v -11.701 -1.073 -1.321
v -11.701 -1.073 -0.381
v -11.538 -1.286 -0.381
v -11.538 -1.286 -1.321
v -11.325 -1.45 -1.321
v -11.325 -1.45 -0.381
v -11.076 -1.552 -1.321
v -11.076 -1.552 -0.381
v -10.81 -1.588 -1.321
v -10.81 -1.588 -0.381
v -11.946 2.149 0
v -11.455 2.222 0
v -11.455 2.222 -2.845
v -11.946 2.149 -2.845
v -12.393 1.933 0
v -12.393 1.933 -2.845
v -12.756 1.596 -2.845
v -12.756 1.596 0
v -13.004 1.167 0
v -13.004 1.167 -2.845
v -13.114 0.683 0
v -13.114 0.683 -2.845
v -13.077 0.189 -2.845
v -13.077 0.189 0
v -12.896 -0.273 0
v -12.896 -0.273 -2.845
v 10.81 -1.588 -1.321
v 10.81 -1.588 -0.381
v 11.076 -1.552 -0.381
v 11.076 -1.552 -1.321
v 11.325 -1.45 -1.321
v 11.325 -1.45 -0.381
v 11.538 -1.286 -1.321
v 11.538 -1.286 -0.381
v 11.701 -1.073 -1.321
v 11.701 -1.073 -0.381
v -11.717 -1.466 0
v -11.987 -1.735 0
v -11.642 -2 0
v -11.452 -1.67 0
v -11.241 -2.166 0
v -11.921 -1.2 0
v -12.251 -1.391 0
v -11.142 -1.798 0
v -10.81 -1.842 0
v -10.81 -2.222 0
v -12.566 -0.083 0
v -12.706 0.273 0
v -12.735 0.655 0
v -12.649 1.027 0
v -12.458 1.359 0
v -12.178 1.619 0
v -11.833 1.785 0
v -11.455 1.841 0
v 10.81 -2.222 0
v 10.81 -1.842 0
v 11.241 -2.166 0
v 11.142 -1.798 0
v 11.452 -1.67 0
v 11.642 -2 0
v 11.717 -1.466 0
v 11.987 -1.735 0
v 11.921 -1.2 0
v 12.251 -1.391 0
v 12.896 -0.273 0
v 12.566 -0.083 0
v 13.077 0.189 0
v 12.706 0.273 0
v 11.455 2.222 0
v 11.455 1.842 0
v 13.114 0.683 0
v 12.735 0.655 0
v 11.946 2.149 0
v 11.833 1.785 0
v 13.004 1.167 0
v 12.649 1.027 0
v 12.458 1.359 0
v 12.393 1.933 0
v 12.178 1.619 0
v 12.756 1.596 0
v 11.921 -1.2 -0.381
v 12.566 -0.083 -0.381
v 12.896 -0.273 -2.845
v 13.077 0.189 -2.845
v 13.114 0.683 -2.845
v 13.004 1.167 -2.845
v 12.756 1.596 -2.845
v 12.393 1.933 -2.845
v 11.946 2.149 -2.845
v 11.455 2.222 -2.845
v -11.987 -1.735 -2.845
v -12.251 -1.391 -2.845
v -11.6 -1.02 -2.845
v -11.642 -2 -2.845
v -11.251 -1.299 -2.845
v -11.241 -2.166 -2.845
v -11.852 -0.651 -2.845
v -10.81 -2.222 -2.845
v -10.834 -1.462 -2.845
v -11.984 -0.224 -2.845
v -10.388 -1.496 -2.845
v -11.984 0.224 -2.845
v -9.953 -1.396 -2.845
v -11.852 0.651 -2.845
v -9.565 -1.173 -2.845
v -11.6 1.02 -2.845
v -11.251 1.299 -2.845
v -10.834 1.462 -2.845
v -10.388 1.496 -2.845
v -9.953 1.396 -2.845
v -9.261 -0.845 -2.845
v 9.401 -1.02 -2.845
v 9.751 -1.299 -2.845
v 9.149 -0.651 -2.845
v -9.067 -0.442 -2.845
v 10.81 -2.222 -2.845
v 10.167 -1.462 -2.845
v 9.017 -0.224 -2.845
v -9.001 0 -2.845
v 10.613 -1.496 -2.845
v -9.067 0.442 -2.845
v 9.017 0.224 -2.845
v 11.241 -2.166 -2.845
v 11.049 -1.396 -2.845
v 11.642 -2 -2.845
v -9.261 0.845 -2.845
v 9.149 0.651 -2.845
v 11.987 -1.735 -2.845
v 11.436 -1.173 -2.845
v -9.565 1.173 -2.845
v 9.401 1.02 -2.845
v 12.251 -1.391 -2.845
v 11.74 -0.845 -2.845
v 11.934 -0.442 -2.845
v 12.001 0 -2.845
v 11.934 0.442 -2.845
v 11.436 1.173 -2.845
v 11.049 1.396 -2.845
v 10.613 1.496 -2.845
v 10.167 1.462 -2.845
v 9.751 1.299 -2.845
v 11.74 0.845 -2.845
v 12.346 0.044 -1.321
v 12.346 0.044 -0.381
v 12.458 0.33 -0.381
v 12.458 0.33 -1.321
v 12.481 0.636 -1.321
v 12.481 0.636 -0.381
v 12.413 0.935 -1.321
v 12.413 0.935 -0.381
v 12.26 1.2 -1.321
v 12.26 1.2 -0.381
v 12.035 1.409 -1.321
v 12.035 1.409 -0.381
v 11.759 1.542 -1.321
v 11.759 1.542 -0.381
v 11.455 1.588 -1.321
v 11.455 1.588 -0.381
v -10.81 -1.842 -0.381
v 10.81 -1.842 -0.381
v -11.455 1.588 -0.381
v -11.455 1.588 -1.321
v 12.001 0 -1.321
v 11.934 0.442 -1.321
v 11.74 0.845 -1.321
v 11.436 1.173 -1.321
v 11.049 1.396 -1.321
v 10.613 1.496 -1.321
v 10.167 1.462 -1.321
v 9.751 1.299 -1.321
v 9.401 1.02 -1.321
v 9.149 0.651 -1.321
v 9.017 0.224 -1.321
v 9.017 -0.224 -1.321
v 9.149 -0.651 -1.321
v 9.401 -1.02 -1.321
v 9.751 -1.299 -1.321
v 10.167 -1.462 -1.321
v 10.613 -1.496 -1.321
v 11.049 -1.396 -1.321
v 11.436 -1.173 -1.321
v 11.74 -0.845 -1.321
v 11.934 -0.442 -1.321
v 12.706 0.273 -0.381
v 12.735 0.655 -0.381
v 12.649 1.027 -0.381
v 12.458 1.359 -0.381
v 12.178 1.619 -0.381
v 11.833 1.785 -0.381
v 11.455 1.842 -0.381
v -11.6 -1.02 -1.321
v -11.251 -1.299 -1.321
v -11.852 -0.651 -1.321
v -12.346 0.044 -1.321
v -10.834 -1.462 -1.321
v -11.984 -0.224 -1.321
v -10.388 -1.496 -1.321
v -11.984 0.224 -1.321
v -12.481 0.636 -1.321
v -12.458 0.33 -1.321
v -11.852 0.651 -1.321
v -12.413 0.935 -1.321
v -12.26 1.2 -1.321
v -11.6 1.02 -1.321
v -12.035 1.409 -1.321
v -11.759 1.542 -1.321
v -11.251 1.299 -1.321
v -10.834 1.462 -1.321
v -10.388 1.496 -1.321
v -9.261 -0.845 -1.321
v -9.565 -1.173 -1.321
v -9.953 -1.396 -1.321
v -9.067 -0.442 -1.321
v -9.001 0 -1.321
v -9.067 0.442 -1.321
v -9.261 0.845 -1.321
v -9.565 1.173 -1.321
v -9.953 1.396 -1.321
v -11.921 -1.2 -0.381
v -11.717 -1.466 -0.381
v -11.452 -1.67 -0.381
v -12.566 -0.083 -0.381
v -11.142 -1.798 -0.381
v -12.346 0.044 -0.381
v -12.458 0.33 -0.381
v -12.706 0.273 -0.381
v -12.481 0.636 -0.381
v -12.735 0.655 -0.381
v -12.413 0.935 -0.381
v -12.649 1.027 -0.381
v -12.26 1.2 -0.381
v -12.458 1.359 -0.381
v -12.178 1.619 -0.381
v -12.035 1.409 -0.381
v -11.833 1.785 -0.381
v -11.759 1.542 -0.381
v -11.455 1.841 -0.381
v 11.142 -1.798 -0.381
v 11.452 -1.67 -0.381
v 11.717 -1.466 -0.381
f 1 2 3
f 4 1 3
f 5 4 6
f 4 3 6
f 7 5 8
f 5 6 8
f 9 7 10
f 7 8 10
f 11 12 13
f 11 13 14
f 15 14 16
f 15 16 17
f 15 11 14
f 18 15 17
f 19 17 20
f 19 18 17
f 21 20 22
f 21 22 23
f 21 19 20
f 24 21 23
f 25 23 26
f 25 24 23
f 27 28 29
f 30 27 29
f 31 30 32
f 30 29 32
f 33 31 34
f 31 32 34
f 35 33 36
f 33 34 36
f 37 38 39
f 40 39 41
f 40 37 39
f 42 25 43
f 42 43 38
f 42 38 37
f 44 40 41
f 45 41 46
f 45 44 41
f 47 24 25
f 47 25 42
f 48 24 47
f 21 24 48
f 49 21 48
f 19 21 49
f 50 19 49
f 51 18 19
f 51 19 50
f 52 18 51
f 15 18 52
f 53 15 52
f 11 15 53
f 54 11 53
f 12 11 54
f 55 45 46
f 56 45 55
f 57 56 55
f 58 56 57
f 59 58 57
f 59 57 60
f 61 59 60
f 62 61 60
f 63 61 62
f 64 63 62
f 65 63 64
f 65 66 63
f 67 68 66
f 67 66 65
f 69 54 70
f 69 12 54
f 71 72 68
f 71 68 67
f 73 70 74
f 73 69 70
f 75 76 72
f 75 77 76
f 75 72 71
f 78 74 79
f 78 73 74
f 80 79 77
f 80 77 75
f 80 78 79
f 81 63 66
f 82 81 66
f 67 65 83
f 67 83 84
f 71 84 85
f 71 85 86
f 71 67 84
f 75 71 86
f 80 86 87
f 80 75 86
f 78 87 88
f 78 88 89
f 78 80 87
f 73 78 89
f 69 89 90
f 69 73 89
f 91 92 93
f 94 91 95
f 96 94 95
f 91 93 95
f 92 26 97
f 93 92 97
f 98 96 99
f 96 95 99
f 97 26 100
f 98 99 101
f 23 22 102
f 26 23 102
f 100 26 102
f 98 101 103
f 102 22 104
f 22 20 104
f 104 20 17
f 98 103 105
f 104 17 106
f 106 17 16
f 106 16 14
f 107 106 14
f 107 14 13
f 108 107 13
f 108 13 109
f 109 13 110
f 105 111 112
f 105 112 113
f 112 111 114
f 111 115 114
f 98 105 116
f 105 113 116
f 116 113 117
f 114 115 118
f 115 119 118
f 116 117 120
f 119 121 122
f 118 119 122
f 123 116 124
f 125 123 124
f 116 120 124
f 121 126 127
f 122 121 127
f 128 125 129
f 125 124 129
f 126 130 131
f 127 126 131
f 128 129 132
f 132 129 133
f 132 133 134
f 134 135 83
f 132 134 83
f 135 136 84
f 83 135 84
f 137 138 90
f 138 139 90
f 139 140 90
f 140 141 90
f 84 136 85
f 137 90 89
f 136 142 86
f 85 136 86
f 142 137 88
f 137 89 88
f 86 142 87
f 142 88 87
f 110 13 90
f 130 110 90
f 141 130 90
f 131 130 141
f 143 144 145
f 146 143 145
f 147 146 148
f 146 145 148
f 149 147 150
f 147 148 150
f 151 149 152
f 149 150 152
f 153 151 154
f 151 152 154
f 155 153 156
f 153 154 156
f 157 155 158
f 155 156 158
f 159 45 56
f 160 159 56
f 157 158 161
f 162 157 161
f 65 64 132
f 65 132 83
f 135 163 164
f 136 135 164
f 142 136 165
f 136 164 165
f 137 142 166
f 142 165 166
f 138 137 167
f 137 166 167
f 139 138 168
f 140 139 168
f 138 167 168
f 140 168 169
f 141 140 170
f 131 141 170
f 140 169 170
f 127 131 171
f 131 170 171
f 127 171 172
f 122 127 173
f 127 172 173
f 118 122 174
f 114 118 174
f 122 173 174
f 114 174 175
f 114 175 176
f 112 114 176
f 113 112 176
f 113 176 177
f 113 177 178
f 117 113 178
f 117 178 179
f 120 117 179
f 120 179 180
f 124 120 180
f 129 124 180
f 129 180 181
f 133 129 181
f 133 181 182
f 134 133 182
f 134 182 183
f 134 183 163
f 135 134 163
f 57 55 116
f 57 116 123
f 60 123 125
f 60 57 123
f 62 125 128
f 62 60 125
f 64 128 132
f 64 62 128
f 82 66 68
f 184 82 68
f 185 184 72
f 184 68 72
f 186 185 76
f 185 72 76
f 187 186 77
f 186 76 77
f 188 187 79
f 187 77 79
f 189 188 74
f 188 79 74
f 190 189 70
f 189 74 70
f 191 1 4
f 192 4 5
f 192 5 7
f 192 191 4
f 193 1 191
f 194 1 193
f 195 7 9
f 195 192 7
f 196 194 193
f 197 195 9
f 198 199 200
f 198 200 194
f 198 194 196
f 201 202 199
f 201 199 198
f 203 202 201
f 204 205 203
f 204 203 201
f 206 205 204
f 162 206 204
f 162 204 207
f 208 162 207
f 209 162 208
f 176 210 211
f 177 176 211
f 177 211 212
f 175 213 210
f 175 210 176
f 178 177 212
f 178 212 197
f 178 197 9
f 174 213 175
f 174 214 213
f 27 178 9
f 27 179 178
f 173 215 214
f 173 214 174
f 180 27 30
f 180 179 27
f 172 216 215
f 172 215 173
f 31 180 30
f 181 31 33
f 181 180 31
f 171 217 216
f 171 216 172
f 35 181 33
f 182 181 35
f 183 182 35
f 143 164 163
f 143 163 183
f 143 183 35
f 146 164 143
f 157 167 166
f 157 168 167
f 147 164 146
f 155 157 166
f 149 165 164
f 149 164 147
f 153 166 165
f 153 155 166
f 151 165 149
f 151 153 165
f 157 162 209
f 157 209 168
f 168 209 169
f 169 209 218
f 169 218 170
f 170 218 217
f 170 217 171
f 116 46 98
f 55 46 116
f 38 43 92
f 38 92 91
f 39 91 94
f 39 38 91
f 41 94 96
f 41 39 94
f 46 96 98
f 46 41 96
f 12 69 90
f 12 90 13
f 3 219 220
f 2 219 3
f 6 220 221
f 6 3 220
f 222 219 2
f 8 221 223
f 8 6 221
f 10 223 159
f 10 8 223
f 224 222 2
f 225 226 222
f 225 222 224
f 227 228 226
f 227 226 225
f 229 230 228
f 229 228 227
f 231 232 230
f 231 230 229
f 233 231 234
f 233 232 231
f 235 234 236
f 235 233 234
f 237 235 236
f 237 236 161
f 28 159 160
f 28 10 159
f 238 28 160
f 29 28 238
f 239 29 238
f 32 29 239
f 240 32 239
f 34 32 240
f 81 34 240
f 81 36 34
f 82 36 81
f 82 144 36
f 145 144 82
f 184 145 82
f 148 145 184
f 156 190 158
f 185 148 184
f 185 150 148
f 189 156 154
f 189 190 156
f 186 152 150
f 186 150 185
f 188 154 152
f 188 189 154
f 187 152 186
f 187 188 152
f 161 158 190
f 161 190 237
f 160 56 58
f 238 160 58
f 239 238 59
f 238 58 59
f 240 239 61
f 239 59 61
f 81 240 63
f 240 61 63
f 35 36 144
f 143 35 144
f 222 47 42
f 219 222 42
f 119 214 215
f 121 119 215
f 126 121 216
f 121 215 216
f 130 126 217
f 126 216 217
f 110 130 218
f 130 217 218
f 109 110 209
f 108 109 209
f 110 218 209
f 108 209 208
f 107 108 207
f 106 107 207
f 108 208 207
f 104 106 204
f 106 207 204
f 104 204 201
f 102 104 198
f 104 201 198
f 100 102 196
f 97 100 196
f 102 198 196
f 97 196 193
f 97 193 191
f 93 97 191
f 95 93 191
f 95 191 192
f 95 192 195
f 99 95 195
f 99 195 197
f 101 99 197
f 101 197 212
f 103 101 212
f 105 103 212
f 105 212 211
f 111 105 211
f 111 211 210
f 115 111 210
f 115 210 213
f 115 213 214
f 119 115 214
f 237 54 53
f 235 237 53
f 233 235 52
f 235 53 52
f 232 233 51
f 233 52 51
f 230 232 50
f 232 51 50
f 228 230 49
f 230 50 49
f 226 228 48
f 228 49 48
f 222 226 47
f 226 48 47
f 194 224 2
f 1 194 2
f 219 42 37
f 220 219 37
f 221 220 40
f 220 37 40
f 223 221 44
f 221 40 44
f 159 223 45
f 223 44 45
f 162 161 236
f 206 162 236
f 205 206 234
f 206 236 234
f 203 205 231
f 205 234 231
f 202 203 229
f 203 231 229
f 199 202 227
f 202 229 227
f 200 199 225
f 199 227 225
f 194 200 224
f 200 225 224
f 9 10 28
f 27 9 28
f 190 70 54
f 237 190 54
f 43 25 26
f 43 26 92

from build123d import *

# Parameters (mm, degrees)
F0_R     = 1.5
F1_DEPTH = 2.8448
F2_DEPTH = 1.3208
F3_DEPTH = 0.381
F4_DEPTH = 2.8458


with BuildPart() as f1:
    # F0 (on Top) → F1 (new body)
    with BuildSketch(Plane.XY):
        with BuildLine():
            Line((11.4554, 2.2225), (-11.4554, 2.2225))
            ThreePointArc((-11.4554, 2.2225), (-12.896206, 1.39065), (-12.896206, -0.27305))
            Line((-12.896206, -0.27305), (-12.25096, -1.39065))
            ThreePointArc((-12.25096, -1.39065), (-11.642003, -1.999606), (-10.810153, -2.2225))
            Line((-10.810153, -2.2225), (10.810153, -2.2225))
            ThreePointArc((10.810153, -2.2225), (11.642003, -1.999606), (12.25096, -1.39065))
            Line((12.25096, -1.39065), (12.896206, -0.27305))
            ThreePointArc((12.896206, -0.27305), (12.896206, 1.39065), (11.4554, 2.2225))
        make_face()
        with BuildLine():
            ThreePointArc((-12.566251, -0.08255), (-12.566251, 1.20015), (-11.4554, 1.8415))
            Line((-11.4554, 1.8415), (11.4554, 1.8415))
            ThreePointArc((11.4554, 1.8415), (12.566251, 1.20015), (12.566251, -0.08255))
            Line((12.566251, -0.08255), (11.921004, -1.20015))
            ThreePointArc((11.921004, -1.20015), (11.451503, -1.669651), (10.810153, -1.8415))
            Line((10.810153, -1.8415), (-10.810153, -1.8415))
            ThreePointArc((-10.810153, -1.8415), (-11.451503, -1.669651), (-11.921004, -1.20015))
            Line((-11.921004, -1.20015), (-12.566251, -0.08255))
        make_face(mode=Mode.SUBTRACT)
        with BuildLine():
            Line((11.4554, 1.8415), (-11.4554, 1.8415))
            ThreePointArc((-11.4554, 1.8415), (-12.566251, 1.20015), (-12.566251, -0.08255))
            Line((-12.566251, -0.08255), (-11.921004, -1.20015))
            ThreePointArc((-11.921004, -1.20015), (-11.451503, -1.669651), (-10.810153, -1.8415))
            Line((-10.810153, -1.8415), (10.810153, -1.8415))
            ThreePointArc((10.810153, -1.8415), (11.451503, -1.669651), (11.921004, -1.20015))
            Line((11.921004, -1.20015), (12.566251, -0.08255))
            ThreePointArc((12.566251, -0.08255), (12.566251, 1.20015), (11.4554, 1.8415))
        make_face()
        with BuildLine():
            ThreePointArc((-12.34628, 0.04445), (-12.34628, 1.07315), (-11.4554, 1.5875))
            Line((-11.4554, 1.5875), (11.4554, 1.5875))
            ThreePointArc((11.4554, 1.5875), (12.34628, 1.07315), (12.34628, 0.04445))
            Line((12.34628, 0.04445), (11.701034, -1.07315))
            ThreePointArc((11.701034, -1.07315), (11.324503, -1.44968), (10.810153, -1.5875))
            Line((10.810153, -1.5875), (-10.810153, -1.5875))
            ThreePointArc((-10.810153, -1.5875), (-11.324503, -1.44968), (-11.701034, -1.07315))
            Line((-11.701034, -1.07315), (-12.34628, 0.04445))
        make_face(mode=Mode.SUBTRACT)
        with BuildLine():
            Line((11.4554, 1.5875), (-11.4554, 1.5875))
            ThreePointArc((-11.4554, 1.5875), (-12.34628, 1.07315), (-12.34628, 0.04445))
            Line((-12.34628, 0.04445), (-11.701034, -1.07315))
            ThreePointArc((-11.701034, -1.07315), (-11.324503, -1.44968), (-10.810153, -1.5875))
            Line((-10.810153, -1.5875), (10.810153, -1.5875))
            ThreePointArc((10.810153, -1.5875), (11.324503, -1.44968), (11.701034, -1.07315))
            Line((11.701034, -1.07315), (12.34628, 0.04445))
            ThreePointArc((12.34628, 0.04445), (12.34628, 1.07315), (11.4554, 1.5875))
        make_face()
        with Locations((-10.500578, 0)):
            Circle(F0_R, mode=Mode.SUBTRACT)
        with Locations((10.500578, 0)):
            Circle(F0_R, mode=Mode.SUBTRACT)
        with Locations((-10.500578, 0)):
            Circle(F0_R)
        with Locations((10.500578, 0)):
            Circle(F0_R)
    extrude(amount=-F1_DEPTH)

    # F0 (on Top) → F2 (cut)
    with BuildSketch(Plane.XY):
        with BuildLine():
            Line((11.4554, 1.5875), (-11.4554, 1.5875))
            ThreePointArc((-11.4554, 1.5875), (-12.34628, 1.07315), (-12.34628, 0.04445))
            Line((-12.34628, 0.04445), (-11.701034, -1.07315))
            ThreePointArc((-11.701034, -1.07315), (-11.324503, -1.44968), (-10.810153, -1.5875))
            Line((-10.810153, -1.5875), (10.810153, -1.5875))
            ThreePointArc((10.810153, -1.5875), (11.324503, -1.44968), (11.701034, -1.07315))
            Line((11.701034, -1.07315), (12.34628, 0.04445))
            ThreePointArc((12.34628, 0.04445), (12.34628, 1.07315), (11.4554, 1.5875))
        make_face()
        with Locations((-10.500578, 0)):
            Circle(F0_R, mode=Mode.SUBTRACT)
        with Locations((10.500578, 0)):
            Circle(F0_R, mode=Mode.SUBTRACT)
        with Locations((-10.500578, 0)):
            Circle(F0_R)
        with Locations((10.500578, 0)):
            Circle(F0_R)
    extrude(amount=-F2_DEPTH, mode=Mode.SUBTRACT)

    # F0 (on Top) → F3 (cut)
    with BuildSketch(Plane.XY):
        with BuildLine():
            Line((11.4554, 1.8415), (-11.4554, 1.8415))
            ThreePointArc((-11.4554, 1.8415), (-12.566251, 1.20015), (-12.566251, -0.08255))
            Line((-12.566251, -0.08255), (-11.921004, -1.20015))
            ThreePointArc((-11.921004, -1.20015), (-11.451503, -1.669651), (-10.810153, -1.8415))
            Line((-10.810153, -1.8415), (10.810153, -1.8415))
            ThreePointArc((10.810153, -1.8415), (11.451503, -1.669651), (11.921004, -1.20015))
            Line((11.921004, -1.20015), (12.566251, -0.08255))
            ThreePointArc((12.566251, -0.08255), (12.566251, 1.20015), (11.4554, 1.8415))
        make_face()
        with BuildLine():
            ThreePointArc((-12.34628, 0.04445), (-12.34628, 1.07315), (-11.4554, 1.5875))
            Line((-11.4554, 1.5875), (11.4554, 1.5875))
            ThreePointArc((11.4554, 1.5875), (12.34628, 1.07315), (12.34628, 0.04445))
            Line((12.34628, 0.04445), (11.701034, -1.07315))
            ThreePointArc((11.701034, -1.07315), (11.324503, -1.44968), (10.810153, -1.5875))
            Line((10.810153, -1.5875), (-10.810153, -1.5875))
            ThreePointArc((-10.810153, -1.5875), (-11.324503, -1.44968), (-11.701034, -1.07315))
            Line((-11.701034, -1.07315), (-12.34628, 0.04445))
        make_face(mode=Mode.SUBTRACT)
    extrude(amount=-F3_DEPTH, mode=Mode.SUBTRACT)

    # F0 (on Top) → F4 (cut, through all)
    with BuildSketch(Plane.XY):
        with Locations((-10.500578, 0)):
            Circle(F0_R)
        with Locations((10.500578, 0)):
            Circle(F0_R)
    extrude(amount=-F4_DEPTH, mode=Mode.SUBTRACT)


solid = f1.part
